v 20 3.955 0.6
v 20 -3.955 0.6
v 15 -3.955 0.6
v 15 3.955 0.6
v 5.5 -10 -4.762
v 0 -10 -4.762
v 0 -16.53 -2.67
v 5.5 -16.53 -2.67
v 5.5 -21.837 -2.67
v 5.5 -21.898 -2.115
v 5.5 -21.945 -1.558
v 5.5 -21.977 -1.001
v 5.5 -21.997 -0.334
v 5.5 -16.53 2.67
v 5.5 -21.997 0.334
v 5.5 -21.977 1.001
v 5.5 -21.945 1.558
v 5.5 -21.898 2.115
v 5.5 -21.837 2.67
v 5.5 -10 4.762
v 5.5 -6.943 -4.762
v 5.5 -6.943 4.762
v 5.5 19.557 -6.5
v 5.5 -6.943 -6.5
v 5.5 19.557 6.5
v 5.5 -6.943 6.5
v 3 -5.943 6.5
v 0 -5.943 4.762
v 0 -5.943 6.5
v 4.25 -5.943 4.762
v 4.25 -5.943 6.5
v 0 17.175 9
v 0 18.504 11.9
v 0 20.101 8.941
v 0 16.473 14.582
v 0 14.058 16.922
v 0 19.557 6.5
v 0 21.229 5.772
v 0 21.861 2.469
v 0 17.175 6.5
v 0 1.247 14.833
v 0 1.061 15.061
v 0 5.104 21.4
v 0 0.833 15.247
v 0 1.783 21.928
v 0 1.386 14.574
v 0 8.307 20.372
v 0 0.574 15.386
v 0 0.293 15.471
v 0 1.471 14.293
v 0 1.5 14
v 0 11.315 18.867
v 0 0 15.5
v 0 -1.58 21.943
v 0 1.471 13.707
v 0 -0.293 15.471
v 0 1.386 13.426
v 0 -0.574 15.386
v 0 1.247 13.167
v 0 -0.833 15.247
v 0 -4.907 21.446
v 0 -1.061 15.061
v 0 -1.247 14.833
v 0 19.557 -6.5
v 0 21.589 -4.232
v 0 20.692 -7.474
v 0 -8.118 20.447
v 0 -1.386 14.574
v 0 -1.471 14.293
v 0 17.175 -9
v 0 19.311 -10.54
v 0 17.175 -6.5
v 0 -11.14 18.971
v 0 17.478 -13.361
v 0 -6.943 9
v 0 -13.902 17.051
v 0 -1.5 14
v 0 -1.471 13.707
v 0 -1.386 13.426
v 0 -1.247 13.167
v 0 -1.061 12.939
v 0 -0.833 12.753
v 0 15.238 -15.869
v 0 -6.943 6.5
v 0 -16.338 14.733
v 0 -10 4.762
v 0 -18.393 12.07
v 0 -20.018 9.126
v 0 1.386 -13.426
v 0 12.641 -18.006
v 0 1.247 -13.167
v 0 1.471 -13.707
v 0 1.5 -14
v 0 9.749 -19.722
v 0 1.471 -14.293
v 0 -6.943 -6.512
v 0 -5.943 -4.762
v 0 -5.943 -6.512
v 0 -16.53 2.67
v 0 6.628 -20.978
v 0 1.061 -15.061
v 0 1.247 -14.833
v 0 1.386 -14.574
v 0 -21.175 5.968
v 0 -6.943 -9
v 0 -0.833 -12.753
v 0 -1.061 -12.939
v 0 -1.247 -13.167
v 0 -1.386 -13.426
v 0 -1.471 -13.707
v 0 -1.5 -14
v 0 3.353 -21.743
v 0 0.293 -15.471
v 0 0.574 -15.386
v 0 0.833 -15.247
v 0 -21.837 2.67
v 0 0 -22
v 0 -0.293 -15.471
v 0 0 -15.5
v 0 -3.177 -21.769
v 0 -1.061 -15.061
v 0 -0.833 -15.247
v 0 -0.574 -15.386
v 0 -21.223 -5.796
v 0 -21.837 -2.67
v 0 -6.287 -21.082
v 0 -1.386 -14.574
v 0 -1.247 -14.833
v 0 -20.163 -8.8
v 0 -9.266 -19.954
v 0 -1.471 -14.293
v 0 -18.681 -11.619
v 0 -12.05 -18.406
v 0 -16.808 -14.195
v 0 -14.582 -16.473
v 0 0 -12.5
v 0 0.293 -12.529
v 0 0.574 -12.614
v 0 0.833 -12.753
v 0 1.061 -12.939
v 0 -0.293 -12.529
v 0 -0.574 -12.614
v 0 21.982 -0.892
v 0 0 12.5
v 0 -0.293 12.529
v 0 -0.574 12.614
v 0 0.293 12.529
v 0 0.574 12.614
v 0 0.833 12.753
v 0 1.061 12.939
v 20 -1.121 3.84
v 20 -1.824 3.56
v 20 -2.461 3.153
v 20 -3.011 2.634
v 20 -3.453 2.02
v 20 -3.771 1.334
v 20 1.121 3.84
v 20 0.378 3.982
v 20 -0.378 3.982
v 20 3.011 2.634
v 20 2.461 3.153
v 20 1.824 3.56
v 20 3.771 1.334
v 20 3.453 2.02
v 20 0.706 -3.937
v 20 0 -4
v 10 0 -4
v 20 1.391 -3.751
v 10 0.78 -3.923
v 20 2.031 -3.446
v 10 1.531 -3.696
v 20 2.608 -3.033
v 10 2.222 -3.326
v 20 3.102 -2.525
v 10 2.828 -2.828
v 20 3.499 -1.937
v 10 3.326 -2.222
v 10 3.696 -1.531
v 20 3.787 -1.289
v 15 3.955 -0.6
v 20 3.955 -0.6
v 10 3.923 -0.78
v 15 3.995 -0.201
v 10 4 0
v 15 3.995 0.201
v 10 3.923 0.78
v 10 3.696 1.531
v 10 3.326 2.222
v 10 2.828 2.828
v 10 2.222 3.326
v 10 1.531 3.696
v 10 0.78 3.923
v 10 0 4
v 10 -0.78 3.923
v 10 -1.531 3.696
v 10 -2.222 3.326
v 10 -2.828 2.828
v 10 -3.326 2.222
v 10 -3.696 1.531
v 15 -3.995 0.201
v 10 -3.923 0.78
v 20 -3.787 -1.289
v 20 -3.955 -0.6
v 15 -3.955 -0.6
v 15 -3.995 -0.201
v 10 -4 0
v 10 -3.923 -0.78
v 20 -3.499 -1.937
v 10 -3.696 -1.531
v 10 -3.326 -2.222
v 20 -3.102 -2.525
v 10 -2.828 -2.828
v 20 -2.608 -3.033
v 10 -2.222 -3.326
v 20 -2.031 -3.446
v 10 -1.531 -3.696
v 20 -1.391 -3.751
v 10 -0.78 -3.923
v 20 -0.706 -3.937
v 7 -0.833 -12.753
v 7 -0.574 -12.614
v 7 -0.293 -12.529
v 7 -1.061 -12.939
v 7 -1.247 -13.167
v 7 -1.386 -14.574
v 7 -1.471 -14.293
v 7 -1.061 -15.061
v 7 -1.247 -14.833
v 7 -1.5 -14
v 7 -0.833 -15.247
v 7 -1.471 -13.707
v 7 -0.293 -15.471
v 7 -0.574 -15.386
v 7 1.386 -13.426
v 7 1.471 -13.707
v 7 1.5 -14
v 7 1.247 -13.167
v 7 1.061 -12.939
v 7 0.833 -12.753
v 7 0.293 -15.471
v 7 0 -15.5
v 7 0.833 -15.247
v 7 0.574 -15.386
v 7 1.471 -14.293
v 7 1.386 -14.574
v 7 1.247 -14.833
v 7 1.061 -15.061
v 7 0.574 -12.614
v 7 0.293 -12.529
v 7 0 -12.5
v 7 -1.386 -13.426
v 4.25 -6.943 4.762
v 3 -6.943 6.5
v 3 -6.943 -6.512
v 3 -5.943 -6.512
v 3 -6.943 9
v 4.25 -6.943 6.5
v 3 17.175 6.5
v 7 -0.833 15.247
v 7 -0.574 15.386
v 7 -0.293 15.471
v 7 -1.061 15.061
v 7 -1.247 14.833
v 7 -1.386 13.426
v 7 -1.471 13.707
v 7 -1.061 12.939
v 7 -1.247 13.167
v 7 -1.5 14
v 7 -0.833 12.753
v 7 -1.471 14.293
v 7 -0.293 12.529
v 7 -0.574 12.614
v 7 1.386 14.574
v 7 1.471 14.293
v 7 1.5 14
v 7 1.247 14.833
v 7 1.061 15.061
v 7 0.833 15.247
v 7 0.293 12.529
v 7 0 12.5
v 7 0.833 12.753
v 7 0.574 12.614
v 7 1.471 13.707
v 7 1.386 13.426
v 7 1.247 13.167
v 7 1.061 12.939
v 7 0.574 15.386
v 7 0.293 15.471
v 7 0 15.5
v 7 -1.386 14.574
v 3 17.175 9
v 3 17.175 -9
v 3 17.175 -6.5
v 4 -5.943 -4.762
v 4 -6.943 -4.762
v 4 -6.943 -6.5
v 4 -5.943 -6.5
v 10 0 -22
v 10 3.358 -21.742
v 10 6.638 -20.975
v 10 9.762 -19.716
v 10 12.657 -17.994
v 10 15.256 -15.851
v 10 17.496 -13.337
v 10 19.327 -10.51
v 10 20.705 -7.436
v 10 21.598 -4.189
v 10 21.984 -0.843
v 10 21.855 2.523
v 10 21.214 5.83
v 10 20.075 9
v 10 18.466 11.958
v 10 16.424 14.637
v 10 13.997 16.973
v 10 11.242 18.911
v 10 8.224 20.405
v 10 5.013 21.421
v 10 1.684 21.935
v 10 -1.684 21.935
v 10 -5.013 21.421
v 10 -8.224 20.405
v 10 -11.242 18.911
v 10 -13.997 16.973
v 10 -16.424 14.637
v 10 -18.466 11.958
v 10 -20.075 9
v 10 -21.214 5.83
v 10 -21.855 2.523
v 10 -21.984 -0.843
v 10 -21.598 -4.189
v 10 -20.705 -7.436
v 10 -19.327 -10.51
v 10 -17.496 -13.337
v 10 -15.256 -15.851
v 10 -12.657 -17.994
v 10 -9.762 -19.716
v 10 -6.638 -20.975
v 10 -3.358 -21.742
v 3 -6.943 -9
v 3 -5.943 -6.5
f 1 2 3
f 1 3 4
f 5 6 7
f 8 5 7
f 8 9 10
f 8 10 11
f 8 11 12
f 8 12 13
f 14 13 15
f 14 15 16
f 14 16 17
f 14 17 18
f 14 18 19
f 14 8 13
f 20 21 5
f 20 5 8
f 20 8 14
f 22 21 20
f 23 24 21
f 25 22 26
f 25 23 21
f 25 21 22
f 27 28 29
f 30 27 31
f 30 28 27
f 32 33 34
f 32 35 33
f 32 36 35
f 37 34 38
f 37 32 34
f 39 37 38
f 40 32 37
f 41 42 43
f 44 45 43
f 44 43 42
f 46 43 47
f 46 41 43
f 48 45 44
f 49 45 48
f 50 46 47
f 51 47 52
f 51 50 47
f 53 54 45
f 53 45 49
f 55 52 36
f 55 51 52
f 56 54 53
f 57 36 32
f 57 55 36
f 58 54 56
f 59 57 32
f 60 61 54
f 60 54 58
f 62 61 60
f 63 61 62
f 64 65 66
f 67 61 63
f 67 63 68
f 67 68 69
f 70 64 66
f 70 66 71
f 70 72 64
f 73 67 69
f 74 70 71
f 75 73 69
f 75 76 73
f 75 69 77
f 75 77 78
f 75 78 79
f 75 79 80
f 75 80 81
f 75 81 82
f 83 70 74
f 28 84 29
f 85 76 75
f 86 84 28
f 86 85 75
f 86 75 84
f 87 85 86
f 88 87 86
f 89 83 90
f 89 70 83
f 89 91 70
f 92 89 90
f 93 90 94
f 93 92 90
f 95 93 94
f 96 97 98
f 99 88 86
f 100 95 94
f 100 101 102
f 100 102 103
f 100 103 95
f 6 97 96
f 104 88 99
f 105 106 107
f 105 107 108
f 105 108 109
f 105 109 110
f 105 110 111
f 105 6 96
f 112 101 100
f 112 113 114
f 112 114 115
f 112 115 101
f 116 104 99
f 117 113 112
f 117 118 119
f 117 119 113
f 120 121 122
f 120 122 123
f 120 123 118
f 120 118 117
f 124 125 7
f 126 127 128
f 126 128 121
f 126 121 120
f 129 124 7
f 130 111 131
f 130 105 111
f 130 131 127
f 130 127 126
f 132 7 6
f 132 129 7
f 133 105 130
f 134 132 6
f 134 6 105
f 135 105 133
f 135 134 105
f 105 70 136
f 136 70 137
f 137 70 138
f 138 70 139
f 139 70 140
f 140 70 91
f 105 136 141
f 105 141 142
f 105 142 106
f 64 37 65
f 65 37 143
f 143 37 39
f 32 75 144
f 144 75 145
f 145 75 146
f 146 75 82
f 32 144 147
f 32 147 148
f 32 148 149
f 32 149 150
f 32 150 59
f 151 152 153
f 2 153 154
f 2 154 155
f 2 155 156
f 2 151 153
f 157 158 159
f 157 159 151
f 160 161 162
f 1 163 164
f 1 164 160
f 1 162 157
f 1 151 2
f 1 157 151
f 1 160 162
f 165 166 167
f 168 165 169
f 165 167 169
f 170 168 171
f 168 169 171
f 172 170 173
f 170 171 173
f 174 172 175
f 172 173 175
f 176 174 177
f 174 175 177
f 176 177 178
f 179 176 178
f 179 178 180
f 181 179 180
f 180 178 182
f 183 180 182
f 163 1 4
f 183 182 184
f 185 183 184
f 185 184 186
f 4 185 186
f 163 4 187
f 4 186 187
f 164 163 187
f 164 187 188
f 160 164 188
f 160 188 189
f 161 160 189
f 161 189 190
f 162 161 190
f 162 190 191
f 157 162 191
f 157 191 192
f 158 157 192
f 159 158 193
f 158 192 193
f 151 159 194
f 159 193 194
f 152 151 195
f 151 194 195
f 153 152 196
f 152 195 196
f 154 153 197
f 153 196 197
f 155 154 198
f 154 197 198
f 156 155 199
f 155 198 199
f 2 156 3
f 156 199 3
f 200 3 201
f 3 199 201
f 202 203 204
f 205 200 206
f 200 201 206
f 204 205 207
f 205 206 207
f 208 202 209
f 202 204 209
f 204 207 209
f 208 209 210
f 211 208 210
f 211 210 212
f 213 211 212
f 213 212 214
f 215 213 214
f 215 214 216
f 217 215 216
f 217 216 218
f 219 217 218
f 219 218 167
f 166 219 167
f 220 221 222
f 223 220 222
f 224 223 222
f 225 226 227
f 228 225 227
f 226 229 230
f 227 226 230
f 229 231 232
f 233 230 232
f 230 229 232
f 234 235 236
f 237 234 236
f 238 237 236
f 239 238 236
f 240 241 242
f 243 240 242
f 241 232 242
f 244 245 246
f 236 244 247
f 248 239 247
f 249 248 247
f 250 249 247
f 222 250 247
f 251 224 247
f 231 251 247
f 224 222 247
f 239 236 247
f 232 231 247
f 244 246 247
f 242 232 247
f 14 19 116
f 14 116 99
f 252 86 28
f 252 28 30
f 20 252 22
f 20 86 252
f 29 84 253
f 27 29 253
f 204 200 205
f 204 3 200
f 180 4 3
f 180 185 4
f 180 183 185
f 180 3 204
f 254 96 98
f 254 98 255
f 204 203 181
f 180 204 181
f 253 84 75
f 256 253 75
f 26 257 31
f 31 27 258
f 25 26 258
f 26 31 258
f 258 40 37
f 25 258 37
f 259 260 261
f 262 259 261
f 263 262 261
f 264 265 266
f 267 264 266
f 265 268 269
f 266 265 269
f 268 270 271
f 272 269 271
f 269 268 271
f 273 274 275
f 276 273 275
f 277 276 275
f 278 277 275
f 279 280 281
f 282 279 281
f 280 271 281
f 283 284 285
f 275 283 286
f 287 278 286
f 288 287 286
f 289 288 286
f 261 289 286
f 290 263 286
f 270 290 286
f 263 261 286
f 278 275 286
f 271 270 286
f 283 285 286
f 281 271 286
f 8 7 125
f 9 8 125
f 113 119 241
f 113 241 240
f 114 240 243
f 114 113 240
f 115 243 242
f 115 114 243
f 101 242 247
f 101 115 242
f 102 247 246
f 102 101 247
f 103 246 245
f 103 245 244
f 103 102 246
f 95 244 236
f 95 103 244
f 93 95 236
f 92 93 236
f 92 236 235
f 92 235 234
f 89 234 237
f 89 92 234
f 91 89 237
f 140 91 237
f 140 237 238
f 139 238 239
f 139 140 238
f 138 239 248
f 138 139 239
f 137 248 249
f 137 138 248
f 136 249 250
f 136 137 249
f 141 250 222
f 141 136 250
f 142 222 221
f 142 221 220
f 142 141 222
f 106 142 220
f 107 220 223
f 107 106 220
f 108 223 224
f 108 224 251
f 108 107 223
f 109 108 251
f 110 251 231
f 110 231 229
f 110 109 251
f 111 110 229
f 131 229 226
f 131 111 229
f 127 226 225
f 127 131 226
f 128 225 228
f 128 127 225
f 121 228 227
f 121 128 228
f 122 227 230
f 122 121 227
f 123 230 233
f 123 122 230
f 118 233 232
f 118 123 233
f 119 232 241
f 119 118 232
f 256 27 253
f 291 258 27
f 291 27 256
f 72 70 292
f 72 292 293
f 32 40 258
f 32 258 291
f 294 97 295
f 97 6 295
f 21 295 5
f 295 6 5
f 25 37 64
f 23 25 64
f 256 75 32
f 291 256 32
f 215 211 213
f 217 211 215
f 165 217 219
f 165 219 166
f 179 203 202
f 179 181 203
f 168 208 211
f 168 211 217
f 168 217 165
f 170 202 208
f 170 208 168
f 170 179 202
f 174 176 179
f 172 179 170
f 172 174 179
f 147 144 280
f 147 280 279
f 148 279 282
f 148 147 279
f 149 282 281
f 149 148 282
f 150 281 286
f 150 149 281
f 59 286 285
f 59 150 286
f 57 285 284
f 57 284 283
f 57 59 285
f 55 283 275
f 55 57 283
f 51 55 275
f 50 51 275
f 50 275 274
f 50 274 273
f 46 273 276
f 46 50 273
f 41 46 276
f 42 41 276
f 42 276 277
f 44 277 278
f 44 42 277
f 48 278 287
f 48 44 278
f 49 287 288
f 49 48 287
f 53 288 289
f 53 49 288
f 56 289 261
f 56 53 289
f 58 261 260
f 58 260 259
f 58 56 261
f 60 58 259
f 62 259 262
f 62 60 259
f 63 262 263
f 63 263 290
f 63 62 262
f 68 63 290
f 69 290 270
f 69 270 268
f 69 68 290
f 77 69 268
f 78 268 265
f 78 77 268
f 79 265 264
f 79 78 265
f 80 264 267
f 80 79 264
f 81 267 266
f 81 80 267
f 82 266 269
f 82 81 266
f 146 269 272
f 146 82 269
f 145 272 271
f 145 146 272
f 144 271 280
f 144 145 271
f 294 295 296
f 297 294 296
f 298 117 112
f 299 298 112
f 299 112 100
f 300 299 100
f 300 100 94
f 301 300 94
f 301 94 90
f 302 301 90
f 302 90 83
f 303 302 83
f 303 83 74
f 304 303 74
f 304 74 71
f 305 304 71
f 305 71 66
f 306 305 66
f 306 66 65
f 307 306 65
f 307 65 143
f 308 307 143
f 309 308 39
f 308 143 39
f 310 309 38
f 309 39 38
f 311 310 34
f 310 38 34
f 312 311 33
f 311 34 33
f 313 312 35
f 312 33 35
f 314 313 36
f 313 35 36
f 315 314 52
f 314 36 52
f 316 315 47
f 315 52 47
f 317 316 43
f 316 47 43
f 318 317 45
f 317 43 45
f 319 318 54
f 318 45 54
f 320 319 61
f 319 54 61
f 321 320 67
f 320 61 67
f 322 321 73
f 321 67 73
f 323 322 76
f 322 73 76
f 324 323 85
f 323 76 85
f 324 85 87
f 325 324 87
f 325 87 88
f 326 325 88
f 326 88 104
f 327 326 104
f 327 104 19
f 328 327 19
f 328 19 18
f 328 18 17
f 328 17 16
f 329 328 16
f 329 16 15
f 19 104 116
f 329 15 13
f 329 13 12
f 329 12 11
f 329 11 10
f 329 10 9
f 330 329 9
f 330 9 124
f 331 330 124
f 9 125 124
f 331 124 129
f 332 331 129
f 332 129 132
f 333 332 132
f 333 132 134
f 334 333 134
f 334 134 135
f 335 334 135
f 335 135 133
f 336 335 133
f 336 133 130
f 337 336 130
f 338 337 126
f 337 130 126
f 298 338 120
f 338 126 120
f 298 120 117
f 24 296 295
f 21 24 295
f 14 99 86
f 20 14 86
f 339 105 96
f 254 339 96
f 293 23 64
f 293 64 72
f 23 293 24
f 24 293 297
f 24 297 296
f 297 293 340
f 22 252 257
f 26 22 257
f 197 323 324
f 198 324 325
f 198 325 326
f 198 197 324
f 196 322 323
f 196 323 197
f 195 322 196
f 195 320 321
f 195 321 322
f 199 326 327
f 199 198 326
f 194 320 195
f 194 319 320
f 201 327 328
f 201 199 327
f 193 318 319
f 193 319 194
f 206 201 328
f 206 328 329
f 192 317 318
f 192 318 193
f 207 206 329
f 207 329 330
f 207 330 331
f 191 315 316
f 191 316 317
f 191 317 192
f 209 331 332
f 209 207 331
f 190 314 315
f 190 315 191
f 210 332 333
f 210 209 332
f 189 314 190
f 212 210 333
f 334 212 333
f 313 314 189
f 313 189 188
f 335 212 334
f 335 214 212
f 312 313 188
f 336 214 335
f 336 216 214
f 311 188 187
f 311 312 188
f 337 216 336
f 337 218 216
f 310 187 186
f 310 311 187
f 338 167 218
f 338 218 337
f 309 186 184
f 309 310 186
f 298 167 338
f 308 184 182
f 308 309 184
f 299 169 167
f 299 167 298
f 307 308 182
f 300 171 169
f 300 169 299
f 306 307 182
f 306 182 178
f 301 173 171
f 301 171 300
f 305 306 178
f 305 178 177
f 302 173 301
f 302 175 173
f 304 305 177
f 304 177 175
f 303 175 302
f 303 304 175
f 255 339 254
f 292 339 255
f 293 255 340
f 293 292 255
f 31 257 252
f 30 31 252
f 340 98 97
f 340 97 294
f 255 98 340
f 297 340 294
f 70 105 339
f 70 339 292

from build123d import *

# Parameters (mm, degrees)
SKETCH1_R           = 22
BOSS_EXTRUDE1_DEPTH = 10
CUT_EXTRUDE2_DEPTH  = 5.5
SKETCH15_W          = 18
SKETCH15_H          = 24.118038922
CUT_EXTRUDE3_DEPTH  = 3
SKETCH16_R          = 4
BOSS_EXTRUDE2_DEPTH = 10
CUT_EXTRUDE4_START  = 20
SKETCH8_W           = 1.2
SKETCH8_H           = 10
CUT_EXTRUDE4_DEPTH  = 5
SKETCH17_W          = 4
SKETCH17_H          = 1.75
BOSS_EXTRUDE3_DEPTH = 1
SKETCH18_W          = 4.25
SKETCH18_H          = 1.737607108
BOSS_EXTRUDE4_DEPTH = 1
SKETCH22_R          = 1.5
CUT_EXTRUDE7_DEPTH  = 7


with BuildPart() as part:
    # Sketch1 → Boss-Extrude1 (new body)
    with BuildSketch(Plane(origin=(0, 0, 0), x_dir=(0, 0, -1), z_dir=(1, 0, 0))):
        Circle(SKETCH1_R)
    extrude(amount=BOSS_EXTRUDE1_DEPTH)

    # Sketch13 → Cut-Extrude2 (cut)
    with BuildSketch(Plane(origin=(0, 0, 0), x_dir=(0, 0, -1), z_dir=(1, 0, 0))):
        with BuildLine():
            Line((-2.670420152, -16.85816067), (-2.670420152, -16.530371213))
            Line((-2.670420152, -16.530371213), (-4.762392892, -10))
            Line((-4.762392892, -10), (-4.762392892, -6.943148259))
            Line((-4.762392892, -6.943148259), (-6.5, -6.943148259))
            Line((-6.5, -6.943148259), (-6.5, 19.556851741))
            Line((-6.5, 19.556851741), (6.5, 19.556851741))
            Line((6.5, 19.556851741), (6.5, -6.943148259))
            Line((6.5, -6.943148259), (4.762392892, -6.943148259))
            Line((4.762392892, -6.943148259), (4.762392892, -10))
            Line((4.762392892, -10), (2.670420152, -16.530371213))
            Line((2.670420152, -16.530371213), (2.670420152, -16.85816067))
            Line((2.670420152, -16.85816067), (2.670420152, -21.837327131))
            ThreePointArc((2.670420152, -21.837327131), (1.836835043, -21.92318492), (1.000584871, -21.977234355))
            Line((1.000584871, -21.977234355), (0, -25.25))
            Line((0, -25.25), (-1.000584871, -21.977234355))
            ThreePointArc((-1.000584871, -21.977234355), (-1.836835043, -21.92318492), (-2.670420152, -21.837327131))
            Line((-2.670420152, -21.837327131), (-2.670420152, -16.85816067))
        make_face()
    extrude(amount=CUT_EXTRUDE2_DEPTH, mode=Mode.SUBTRACT)

    # Sketch15 → Cut-Extrude3 (cut)
    with BuildSketch(Plane.ZY):
        with Locations((0, 5.115871202)):
            Rectangle(SKETCH15_W, SKETCH15_H)
    extrude(amount=-CUT_EXTRUDE3_DEPTH, mode=Mode.SUBTRACT)

    # Sketch16 → Boss-Extrude2 (add)
    with BuildSketch(Plane(origin=(10, 0, 0), x_dir=(0, 0, -1), z_dir=(1, 0, 0))):
        Circle(SKETCH16_R)
    extrude(amount=BOSS_EXTRUDE2_DEPTH)

    # Sketch8 → Cut-Extrude4 (cut)
    with BuildSketch(Plane(origin=(0, 0, 0), x_dir=(0, 0, -1), z_dir=(1, 0, 0)).offset(CUT_EXTRUDE4_START)):
        Rectangle(SKETCH8_W, SKETCH8_H)
    extrude(amount=-CUT_EXTRUDE4_DEPTH, mode=Mode.SUBTRACT)

    # Sketch17 → Boss-Extrude3 (add)
    with BuildSketch(Plane(origin=(0, -6.943148259, 0), x_dir=(1, 0, 0), z_dir=(0, 1, 0))):
        with Locations((2, 5.637392892)):
            Rectangle(SKETCH17_W, SKETCH17_H)
    extrude(amount=BOSS_EXTRUDE3_DEPTH)

    # Sketch18 → Boss-Extrude4 (add)
    with BuildSketch(Plane(origin=(0, -6.943148259, 0), x_dir=(1, 0, 0), z_dir=(0, 1, 0))):
        with Locations((2.125, -5.631196446)):
            Rectangle(SKETCH18_W, SKETCH18_H)
    extrude(amount=BOSS_EXTRUDE4_DEPTH)

    # Sketch22 → Cut-Extrude7 (cut)
    with BuildSketch(Plane(origin=(0, 0, 0), x_dir=(0, 0, -1), z_dir=(1, 0, 0))):
        with Locations((-14, 0)):
            Circle(SKETCH22_R)
        with Locations((14, 0)):
            Circle(SKETCH22_R)
    extrude(amount=CUT_EXTRUDE7_DEPTH, mode=Mode.SUBTRACT)


solid = part.part
